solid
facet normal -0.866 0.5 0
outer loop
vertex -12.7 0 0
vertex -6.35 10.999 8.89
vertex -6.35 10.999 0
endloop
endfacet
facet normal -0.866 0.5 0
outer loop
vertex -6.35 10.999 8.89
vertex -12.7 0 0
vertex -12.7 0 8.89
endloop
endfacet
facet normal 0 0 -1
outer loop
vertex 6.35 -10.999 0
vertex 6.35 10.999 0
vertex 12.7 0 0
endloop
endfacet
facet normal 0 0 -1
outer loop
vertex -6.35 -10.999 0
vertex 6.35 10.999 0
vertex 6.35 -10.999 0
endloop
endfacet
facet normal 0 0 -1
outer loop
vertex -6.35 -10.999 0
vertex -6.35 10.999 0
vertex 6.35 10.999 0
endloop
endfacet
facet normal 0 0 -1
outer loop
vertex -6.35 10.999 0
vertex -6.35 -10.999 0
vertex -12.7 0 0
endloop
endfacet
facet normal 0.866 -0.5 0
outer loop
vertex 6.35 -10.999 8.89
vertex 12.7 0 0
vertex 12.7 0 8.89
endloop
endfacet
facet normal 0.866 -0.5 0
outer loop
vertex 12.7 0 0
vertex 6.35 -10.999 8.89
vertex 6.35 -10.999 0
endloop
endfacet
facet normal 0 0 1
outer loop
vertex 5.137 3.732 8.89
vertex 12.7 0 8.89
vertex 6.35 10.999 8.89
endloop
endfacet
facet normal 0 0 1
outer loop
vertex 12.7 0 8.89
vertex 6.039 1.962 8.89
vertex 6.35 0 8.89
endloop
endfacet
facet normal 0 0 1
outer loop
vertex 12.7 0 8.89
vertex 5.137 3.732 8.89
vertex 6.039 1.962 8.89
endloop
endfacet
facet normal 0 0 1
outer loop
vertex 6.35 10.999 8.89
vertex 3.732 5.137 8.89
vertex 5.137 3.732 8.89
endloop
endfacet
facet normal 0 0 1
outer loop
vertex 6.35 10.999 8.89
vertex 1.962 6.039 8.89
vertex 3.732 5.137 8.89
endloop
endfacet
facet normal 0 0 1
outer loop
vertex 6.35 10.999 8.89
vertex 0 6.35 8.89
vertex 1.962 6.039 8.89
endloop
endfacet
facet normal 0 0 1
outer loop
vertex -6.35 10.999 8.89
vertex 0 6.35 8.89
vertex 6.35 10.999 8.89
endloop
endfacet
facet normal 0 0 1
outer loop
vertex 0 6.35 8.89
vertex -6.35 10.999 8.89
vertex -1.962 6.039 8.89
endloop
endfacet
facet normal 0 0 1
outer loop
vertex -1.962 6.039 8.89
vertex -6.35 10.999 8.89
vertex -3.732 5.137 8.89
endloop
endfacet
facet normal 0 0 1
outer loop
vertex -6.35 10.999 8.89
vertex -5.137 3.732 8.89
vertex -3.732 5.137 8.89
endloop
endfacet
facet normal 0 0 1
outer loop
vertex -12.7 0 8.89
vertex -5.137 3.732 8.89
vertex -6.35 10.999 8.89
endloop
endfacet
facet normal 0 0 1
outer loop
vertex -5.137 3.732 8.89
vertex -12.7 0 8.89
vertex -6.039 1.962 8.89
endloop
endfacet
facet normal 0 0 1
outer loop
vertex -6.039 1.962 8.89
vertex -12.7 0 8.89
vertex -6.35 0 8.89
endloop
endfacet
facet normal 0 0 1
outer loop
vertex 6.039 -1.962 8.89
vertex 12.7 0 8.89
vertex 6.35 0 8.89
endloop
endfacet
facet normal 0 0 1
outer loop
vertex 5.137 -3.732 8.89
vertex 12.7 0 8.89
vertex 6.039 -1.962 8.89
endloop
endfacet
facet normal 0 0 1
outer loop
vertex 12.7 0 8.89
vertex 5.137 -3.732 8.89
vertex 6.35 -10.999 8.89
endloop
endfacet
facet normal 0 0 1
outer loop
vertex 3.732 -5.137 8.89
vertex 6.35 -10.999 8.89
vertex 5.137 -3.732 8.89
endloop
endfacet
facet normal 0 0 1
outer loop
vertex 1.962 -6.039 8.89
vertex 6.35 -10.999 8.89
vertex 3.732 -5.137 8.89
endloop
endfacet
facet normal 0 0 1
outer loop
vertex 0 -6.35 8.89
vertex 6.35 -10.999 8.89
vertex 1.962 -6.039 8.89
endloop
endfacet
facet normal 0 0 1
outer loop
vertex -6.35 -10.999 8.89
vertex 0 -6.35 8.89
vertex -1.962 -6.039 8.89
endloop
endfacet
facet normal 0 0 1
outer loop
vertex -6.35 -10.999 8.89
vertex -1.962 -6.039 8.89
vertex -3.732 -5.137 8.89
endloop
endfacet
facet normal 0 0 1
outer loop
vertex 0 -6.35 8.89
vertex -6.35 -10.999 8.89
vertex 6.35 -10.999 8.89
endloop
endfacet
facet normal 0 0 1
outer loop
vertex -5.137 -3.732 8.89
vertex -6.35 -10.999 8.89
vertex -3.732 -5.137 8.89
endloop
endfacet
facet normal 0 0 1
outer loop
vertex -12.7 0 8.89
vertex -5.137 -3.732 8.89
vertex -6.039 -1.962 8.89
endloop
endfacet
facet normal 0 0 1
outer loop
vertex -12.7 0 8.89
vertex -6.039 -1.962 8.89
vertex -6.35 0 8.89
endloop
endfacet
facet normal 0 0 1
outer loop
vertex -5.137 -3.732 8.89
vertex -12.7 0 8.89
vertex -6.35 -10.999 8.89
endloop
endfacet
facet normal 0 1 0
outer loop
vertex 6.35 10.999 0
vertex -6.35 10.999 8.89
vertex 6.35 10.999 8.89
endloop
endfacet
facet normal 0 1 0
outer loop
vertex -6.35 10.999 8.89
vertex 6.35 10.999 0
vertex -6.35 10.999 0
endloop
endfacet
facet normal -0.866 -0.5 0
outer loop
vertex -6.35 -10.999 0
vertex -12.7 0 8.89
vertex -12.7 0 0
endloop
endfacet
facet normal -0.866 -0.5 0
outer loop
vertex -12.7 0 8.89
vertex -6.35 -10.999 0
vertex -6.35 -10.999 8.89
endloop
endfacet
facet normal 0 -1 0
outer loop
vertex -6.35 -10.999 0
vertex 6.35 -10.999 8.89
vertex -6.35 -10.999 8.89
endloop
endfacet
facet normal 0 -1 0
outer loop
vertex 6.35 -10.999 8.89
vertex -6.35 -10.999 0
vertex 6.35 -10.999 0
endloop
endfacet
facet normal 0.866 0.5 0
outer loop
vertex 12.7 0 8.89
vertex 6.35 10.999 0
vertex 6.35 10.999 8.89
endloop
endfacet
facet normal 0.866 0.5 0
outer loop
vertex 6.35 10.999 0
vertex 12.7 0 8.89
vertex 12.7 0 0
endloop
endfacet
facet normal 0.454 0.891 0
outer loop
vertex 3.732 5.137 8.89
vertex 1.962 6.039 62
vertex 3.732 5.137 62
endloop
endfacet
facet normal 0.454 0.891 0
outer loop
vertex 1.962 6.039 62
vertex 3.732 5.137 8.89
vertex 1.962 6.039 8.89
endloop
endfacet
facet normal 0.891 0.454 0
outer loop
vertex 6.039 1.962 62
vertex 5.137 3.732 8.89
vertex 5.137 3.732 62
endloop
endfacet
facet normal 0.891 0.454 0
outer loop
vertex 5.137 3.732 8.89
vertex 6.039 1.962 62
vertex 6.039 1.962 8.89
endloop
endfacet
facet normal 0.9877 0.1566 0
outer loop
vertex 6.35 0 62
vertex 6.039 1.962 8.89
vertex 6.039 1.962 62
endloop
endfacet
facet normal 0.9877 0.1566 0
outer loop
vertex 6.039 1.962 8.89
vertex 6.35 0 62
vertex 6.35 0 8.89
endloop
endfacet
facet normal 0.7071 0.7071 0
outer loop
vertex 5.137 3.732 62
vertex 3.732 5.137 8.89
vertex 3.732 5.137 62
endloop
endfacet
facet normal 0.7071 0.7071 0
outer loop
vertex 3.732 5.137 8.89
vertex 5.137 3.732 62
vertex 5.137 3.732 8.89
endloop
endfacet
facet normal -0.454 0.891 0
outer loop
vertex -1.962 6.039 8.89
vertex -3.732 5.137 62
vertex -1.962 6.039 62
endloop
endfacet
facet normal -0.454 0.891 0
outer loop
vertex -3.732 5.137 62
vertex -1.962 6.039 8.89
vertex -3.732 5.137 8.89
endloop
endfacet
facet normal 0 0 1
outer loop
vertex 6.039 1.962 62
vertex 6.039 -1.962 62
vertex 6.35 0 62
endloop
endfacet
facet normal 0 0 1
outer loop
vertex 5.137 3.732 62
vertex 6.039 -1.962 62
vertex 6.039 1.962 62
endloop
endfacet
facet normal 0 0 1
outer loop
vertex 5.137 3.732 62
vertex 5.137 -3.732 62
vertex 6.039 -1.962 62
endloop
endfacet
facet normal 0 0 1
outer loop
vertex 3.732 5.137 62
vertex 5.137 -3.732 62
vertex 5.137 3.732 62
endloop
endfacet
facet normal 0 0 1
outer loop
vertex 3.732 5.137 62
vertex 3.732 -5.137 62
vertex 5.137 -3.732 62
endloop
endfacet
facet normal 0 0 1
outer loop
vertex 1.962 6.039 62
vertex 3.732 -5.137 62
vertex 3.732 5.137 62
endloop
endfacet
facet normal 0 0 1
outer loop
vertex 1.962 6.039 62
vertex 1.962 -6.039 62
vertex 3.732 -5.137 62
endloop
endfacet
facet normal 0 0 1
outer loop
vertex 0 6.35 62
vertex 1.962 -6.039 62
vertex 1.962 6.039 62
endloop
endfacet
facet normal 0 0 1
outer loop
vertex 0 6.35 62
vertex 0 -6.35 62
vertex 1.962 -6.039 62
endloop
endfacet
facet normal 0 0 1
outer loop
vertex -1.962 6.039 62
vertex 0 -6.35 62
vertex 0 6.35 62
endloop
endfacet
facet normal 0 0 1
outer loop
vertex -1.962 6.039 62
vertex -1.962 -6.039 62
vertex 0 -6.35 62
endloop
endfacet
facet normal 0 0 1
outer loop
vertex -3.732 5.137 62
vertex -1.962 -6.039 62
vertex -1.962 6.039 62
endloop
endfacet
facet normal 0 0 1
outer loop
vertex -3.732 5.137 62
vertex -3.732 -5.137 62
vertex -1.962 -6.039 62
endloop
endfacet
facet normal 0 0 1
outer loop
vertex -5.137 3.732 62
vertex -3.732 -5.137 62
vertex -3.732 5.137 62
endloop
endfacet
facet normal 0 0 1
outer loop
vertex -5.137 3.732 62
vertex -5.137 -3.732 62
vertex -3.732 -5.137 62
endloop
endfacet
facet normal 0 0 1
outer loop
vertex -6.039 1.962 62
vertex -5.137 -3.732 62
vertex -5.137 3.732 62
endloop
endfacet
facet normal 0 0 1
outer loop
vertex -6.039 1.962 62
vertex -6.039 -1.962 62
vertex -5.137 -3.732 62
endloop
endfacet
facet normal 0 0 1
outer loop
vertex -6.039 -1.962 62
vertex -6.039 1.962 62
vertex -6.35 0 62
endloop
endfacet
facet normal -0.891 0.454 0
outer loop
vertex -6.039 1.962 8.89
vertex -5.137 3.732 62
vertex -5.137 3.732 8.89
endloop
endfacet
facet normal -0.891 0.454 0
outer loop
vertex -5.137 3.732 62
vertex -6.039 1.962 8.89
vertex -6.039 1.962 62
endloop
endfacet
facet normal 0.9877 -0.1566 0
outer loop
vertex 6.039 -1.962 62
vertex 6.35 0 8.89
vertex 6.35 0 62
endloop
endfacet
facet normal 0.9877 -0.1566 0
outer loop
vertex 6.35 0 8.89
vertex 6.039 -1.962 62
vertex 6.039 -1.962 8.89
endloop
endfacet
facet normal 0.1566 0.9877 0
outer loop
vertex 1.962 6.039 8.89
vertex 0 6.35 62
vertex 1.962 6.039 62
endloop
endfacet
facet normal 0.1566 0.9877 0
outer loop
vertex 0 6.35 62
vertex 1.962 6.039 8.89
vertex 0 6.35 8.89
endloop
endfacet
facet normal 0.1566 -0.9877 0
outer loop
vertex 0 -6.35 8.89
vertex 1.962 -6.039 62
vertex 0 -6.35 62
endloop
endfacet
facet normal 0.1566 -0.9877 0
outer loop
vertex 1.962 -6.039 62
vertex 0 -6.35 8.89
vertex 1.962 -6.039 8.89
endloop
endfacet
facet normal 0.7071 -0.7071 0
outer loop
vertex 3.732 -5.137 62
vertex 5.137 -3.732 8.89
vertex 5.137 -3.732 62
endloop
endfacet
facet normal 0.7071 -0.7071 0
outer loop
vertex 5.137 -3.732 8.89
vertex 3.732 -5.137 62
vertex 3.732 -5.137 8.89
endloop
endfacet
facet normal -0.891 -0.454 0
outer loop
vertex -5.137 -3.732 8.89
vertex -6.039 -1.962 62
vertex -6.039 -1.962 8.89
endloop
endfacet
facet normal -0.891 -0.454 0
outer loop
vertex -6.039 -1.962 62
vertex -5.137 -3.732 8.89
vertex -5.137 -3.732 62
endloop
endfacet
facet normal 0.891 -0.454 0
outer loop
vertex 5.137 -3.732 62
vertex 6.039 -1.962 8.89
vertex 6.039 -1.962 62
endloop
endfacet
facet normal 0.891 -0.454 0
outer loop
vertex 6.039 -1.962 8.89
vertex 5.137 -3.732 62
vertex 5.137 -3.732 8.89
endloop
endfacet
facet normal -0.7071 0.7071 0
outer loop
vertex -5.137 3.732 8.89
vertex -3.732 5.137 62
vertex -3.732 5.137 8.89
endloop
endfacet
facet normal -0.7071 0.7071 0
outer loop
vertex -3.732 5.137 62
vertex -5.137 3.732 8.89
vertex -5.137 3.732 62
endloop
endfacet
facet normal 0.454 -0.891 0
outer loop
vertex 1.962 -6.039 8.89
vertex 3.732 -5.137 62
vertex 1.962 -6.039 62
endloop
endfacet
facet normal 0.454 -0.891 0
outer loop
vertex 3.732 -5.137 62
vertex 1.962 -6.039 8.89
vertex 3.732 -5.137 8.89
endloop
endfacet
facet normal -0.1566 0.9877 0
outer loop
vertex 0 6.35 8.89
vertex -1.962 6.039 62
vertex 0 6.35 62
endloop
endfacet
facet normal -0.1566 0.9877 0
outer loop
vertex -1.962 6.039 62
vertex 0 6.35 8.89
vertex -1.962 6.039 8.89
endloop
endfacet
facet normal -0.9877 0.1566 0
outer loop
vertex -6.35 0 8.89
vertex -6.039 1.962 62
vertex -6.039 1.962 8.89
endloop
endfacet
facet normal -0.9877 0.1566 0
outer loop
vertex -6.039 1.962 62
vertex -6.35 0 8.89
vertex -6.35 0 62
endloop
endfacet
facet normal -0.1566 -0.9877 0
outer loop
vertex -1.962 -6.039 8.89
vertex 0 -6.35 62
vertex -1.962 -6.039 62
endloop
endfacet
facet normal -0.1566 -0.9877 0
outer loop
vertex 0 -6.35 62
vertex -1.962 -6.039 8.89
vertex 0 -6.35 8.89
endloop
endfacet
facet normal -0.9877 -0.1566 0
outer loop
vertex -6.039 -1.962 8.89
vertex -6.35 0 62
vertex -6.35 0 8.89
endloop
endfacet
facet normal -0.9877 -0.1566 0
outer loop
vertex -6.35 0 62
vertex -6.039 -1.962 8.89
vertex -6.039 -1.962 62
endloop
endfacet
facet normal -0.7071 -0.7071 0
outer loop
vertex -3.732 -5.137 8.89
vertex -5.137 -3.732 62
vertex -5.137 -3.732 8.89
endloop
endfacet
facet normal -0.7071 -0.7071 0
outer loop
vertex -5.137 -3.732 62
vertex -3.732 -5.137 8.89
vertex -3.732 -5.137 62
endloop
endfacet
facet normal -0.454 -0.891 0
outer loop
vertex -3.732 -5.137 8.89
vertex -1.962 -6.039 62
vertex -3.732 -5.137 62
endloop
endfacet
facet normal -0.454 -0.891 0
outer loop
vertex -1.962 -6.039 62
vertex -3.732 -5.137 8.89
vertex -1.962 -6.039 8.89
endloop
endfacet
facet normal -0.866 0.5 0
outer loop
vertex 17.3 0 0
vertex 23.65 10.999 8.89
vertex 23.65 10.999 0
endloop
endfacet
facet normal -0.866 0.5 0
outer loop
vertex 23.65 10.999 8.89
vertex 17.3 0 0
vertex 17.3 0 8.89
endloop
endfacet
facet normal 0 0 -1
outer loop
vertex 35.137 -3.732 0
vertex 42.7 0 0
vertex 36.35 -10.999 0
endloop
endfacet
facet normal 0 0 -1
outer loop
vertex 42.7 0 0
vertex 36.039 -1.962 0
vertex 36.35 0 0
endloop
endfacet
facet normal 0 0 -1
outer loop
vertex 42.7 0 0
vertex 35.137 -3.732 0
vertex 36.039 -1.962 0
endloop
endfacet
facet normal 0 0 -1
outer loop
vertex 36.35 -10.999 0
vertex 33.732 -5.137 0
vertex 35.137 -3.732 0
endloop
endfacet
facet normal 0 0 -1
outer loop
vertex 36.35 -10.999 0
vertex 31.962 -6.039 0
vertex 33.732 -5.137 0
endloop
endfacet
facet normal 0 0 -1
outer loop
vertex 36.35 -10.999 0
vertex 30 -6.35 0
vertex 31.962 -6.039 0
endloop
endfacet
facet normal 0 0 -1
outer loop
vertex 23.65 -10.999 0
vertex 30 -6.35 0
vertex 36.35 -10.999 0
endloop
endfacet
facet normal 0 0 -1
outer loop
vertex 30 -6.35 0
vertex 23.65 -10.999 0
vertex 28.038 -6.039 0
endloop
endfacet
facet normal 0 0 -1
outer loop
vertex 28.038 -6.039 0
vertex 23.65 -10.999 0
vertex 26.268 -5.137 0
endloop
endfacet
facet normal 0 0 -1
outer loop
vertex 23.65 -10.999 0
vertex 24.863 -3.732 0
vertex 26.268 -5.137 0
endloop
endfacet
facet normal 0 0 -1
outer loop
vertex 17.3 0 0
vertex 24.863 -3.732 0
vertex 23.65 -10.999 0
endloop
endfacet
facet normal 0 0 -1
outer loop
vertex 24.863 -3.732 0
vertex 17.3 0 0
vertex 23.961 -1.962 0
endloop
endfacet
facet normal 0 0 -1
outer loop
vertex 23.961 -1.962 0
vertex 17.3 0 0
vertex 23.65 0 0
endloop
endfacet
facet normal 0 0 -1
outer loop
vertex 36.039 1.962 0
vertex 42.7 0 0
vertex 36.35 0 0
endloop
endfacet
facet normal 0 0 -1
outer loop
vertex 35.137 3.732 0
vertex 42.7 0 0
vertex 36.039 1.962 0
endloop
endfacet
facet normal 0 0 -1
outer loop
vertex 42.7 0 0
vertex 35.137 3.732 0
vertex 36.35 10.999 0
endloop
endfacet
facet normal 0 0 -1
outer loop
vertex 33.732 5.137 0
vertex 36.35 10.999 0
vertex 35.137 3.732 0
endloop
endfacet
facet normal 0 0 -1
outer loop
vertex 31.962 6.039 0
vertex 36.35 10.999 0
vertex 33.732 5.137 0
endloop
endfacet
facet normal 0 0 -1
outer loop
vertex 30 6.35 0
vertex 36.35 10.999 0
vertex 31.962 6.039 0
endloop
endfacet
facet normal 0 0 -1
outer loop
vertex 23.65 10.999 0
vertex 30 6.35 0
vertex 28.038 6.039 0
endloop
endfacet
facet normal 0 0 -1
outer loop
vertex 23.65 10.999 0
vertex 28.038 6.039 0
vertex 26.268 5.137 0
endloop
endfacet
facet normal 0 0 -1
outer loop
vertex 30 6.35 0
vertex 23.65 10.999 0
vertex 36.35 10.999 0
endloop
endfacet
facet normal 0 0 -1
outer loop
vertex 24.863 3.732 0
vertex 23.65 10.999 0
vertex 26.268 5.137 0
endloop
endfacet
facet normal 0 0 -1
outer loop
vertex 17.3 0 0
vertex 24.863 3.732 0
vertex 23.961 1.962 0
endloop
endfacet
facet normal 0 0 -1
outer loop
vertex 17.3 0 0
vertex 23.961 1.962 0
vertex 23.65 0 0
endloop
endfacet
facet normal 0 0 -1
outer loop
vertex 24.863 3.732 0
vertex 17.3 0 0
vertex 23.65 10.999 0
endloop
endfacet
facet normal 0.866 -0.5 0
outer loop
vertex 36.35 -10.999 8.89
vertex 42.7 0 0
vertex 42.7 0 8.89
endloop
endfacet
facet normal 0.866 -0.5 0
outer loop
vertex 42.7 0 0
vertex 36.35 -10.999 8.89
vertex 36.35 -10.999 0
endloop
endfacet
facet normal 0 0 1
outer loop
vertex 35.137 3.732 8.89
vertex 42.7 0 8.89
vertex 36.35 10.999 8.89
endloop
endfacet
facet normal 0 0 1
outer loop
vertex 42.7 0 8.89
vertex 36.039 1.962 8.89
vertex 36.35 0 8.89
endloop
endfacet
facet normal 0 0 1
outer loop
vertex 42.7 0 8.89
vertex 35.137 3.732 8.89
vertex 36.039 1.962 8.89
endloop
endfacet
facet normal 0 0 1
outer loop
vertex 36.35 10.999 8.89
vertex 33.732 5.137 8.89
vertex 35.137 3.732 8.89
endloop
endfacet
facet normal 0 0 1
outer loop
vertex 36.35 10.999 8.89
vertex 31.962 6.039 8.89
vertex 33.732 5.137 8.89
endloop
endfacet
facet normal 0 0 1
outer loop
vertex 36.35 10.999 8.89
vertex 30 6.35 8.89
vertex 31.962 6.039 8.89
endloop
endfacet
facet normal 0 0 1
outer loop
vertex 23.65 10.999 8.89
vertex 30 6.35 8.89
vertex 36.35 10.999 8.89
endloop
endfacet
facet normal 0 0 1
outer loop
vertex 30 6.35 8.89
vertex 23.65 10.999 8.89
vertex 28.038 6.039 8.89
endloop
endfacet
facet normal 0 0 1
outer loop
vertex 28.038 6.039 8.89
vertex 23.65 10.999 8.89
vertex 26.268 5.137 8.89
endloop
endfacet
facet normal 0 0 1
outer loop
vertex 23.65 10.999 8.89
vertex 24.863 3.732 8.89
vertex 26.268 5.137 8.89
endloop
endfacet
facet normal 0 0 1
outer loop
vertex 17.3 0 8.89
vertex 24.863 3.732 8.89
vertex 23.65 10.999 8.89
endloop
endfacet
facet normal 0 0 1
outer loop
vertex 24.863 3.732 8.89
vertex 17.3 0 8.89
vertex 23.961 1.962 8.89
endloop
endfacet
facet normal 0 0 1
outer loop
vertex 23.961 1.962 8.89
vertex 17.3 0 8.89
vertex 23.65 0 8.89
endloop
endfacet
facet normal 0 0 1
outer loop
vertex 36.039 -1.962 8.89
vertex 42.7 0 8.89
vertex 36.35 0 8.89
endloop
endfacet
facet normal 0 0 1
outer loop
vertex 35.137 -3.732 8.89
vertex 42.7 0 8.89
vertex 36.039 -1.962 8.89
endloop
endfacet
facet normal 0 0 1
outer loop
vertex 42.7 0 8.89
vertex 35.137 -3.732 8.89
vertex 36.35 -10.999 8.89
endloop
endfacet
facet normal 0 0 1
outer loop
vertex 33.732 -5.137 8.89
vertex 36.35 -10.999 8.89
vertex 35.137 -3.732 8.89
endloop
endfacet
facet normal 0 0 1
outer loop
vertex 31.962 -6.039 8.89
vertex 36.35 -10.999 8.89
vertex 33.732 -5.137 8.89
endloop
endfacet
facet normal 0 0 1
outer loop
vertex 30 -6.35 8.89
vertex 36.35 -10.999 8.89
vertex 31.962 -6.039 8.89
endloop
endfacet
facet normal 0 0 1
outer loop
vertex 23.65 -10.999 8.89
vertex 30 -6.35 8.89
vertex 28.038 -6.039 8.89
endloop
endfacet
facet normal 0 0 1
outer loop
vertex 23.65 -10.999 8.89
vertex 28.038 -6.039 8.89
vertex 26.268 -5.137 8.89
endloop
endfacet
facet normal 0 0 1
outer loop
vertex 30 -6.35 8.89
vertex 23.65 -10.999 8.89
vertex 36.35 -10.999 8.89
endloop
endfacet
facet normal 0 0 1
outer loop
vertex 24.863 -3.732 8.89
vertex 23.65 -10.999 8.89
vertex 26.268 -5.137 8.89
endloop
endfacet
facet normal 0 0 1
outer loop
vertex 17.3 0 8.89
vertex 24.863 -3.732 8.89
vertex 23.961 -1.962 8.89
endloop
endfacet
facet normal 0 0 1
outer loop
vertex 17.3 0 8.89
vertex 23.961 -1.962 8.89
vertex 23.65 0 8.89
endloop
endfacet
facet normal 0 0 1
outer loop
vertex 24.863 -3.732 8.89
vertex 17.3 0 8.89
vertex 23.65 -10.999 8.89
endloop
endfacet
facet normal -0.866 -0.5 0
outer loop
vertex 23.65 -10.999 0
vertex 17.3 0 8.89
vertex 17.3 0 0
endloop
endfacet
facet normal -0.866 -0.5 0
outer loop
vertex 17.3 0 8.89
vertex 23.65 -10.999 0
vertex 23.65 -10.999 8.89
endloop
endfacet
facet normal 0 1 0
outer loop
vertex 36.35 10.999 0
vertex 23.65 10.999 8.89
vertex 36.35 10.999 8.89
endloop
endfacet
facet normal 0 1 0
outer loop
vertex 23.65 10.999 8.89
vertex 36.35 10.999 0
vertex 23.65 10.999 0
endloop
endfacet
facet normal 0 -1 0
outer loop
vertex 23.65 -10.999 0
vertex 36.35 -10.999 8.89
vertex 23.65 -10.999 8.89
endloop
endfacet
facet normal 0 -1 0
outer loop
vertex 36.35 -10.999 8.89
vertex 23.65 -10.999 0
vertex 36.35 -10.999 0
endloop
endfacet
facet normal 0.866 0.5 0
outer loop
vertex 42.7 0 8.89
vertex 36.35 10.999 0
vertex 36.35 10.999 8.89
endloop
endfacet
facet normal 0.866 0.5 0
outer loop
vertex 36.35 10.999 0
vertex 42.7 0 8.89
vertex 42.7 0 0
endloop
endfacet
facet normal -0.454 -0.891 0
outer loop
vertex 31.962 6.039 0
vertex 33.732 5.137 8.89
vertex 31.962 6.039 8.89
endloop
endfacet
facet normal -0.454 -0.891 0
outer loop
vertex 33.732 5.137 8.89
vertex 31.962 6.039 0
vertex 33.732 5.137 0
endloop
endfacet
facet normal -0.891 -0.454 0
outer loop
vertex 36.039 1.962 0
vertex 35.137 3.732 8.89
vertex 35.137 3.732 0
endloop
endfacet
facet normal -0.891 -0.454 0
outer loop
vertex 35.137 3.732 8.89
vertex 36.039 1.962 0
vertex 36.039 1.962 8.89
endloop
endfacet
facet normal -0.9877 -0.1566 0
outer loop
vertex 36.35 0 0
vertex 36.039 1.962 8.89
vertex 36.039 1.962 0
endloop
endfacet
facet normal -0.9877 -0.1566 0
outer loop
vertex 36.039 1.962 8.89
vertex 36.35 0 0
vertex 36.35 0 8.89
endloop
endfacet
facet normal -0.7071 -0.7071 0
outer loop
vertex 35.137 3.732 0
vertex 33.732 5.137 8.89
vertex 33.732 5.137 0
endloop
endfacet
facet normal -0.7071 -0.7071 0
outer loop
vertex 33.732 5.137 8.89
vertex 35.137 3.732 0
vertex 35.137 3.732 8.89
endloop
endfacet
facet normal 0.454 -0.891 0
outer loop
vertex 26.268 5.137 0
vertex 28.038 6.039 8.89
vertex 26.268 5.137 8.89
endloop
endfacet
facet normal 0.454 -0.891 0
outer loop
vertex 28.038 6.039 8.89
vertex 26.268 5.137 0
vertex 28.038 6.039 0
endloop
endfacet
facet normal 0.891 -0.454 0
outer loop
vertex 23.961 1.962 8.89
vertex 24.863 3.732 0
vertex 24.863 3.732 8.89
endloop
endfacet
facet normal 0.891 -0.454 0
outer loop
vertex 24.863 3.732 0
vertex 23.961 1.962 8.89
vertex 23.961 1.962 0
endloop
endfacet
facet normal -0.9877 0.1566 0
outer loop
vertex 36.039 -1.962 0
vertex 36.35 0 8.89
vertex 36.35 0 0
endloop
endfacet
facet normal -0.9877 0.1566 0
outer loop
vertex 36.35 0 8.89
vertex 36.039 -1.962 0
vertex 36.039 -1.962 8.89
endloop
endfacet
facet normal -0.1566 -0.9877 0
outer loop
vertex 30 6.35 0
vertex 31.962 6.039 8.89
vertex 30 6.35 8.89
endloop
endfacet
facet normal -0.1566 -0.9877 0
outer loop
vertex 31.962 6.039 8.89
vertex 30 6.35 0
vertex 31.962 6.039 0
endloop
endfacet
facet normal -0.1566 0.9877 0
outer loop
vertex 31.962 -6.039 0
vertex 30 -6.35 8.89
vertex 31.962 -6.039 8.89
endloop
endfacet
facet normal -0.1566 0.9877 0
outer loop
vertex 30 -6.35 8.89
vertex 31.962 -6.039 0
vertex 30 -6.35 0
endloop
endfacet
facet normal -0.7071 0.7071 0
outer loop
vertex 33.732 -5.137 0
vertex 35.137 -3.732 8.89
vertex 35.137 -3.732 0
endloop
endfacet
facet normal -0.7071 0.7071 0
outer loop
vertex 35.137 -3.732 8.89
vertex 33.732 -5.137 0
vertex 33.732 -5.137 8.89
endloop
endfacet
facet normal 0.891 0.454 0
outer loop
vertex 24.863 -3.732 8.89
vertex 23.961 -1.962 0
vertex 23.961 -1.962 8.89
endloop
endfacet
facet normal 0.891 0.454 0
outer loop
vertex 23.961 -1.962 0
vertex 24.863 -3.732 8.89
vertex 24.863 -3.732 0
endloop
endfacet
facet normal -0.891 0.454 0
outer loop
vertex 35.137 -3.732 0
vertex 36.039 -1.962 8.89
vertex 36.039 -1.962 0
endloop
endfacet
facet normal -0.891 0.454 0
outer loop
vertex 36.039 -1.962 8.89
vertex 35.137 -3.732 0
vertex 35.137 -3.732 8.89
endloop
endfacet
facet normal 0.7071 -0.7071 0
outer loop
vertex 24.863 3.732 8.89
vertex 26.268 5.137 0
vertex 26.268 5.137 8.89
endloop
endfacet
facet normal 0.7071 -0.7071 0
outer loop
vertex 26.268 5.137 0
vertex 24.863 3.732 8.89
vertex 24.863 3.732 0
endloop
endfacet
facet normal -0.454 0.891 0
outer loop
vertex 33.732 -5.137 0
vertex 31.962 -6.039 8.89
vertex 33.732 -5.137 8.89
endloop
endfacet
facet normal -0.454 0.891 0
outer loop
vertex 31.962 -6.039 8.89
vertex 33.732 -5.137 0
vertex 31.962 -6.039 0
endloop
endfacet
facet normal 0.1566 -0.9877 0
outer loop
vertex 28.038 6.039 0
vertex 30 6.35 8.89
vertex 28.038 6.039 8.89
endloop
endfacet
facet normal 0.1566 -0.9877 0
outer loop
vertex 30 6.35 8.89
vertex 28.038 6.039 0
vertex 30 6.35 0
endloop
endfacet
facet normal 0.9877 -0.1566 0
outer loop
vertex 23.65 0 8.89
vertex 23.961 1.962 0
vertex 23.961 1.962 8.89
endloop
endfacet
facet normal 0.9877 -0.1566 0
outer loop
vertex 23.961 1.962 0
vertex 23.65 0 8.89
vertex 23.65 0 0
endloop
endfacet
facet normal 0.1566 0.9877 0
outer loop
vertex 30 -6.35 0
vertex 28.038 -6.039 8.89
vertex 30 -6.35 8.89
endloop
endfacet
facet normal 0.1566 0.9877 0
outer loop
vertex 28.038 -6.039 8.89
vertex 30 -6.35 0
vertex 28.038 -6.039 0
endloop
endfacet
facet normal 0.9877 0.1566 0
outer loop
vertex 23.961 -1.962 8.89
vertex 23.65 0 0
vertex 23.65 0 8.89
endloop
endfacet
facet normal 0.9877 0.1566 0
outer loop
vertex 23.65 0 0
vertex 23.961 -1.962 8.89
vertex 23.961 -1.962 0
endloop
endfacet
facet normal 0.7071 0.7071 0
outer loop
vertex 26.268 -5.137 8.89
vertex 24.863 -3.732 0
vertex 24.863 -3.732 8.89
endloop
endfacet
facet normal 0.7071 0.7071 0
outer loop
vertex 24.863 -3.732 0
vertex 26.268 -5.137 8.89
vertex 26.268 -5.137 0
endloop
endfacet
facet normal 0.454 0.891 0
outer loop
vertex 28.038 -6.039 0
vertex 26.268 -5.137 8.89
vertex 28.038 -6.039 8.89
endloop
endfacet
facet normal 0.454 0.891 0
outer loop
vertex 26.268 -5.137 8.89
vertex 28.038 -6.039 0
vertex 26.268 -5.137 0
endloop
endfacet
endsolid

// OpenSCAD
// file: hexagonalprism.scad
hex_prism(6.2,6);



module hex_prism(r,h){
    linear_extrude(height=h){
        hex(r);
    }
}

module hex(r){
    polygon(points = [[r,0],[r/2,r*sqrt(3)/2],
                [-r/2,r*sqrt(3)/2],[-r,0],
                [-r/2,-r*sqrt(3)/2],[r/2,-r*sqrt(3)/2]]);
}
// main file
use <hexagonalprism.scad>

bolt();

translate([30,0,0]) nut();

module kingpin(){
    bolt(d=12.7,l=75);
}

module bolt(d=12.7,l=62){
    rad = d/2;
    len = l;
    color("gray") hex_prism(2*rad,rad*1.4);
    color("silver") cylinder(r=rad,h=len);
}

module nut(d=12.7){
    rad = d/2;
    color("gray") difference(){
        hex_prism(2*rad,rad*1.4);
        color("silver") cylinder(r=rad,rad*1.4+2);
    }
}
